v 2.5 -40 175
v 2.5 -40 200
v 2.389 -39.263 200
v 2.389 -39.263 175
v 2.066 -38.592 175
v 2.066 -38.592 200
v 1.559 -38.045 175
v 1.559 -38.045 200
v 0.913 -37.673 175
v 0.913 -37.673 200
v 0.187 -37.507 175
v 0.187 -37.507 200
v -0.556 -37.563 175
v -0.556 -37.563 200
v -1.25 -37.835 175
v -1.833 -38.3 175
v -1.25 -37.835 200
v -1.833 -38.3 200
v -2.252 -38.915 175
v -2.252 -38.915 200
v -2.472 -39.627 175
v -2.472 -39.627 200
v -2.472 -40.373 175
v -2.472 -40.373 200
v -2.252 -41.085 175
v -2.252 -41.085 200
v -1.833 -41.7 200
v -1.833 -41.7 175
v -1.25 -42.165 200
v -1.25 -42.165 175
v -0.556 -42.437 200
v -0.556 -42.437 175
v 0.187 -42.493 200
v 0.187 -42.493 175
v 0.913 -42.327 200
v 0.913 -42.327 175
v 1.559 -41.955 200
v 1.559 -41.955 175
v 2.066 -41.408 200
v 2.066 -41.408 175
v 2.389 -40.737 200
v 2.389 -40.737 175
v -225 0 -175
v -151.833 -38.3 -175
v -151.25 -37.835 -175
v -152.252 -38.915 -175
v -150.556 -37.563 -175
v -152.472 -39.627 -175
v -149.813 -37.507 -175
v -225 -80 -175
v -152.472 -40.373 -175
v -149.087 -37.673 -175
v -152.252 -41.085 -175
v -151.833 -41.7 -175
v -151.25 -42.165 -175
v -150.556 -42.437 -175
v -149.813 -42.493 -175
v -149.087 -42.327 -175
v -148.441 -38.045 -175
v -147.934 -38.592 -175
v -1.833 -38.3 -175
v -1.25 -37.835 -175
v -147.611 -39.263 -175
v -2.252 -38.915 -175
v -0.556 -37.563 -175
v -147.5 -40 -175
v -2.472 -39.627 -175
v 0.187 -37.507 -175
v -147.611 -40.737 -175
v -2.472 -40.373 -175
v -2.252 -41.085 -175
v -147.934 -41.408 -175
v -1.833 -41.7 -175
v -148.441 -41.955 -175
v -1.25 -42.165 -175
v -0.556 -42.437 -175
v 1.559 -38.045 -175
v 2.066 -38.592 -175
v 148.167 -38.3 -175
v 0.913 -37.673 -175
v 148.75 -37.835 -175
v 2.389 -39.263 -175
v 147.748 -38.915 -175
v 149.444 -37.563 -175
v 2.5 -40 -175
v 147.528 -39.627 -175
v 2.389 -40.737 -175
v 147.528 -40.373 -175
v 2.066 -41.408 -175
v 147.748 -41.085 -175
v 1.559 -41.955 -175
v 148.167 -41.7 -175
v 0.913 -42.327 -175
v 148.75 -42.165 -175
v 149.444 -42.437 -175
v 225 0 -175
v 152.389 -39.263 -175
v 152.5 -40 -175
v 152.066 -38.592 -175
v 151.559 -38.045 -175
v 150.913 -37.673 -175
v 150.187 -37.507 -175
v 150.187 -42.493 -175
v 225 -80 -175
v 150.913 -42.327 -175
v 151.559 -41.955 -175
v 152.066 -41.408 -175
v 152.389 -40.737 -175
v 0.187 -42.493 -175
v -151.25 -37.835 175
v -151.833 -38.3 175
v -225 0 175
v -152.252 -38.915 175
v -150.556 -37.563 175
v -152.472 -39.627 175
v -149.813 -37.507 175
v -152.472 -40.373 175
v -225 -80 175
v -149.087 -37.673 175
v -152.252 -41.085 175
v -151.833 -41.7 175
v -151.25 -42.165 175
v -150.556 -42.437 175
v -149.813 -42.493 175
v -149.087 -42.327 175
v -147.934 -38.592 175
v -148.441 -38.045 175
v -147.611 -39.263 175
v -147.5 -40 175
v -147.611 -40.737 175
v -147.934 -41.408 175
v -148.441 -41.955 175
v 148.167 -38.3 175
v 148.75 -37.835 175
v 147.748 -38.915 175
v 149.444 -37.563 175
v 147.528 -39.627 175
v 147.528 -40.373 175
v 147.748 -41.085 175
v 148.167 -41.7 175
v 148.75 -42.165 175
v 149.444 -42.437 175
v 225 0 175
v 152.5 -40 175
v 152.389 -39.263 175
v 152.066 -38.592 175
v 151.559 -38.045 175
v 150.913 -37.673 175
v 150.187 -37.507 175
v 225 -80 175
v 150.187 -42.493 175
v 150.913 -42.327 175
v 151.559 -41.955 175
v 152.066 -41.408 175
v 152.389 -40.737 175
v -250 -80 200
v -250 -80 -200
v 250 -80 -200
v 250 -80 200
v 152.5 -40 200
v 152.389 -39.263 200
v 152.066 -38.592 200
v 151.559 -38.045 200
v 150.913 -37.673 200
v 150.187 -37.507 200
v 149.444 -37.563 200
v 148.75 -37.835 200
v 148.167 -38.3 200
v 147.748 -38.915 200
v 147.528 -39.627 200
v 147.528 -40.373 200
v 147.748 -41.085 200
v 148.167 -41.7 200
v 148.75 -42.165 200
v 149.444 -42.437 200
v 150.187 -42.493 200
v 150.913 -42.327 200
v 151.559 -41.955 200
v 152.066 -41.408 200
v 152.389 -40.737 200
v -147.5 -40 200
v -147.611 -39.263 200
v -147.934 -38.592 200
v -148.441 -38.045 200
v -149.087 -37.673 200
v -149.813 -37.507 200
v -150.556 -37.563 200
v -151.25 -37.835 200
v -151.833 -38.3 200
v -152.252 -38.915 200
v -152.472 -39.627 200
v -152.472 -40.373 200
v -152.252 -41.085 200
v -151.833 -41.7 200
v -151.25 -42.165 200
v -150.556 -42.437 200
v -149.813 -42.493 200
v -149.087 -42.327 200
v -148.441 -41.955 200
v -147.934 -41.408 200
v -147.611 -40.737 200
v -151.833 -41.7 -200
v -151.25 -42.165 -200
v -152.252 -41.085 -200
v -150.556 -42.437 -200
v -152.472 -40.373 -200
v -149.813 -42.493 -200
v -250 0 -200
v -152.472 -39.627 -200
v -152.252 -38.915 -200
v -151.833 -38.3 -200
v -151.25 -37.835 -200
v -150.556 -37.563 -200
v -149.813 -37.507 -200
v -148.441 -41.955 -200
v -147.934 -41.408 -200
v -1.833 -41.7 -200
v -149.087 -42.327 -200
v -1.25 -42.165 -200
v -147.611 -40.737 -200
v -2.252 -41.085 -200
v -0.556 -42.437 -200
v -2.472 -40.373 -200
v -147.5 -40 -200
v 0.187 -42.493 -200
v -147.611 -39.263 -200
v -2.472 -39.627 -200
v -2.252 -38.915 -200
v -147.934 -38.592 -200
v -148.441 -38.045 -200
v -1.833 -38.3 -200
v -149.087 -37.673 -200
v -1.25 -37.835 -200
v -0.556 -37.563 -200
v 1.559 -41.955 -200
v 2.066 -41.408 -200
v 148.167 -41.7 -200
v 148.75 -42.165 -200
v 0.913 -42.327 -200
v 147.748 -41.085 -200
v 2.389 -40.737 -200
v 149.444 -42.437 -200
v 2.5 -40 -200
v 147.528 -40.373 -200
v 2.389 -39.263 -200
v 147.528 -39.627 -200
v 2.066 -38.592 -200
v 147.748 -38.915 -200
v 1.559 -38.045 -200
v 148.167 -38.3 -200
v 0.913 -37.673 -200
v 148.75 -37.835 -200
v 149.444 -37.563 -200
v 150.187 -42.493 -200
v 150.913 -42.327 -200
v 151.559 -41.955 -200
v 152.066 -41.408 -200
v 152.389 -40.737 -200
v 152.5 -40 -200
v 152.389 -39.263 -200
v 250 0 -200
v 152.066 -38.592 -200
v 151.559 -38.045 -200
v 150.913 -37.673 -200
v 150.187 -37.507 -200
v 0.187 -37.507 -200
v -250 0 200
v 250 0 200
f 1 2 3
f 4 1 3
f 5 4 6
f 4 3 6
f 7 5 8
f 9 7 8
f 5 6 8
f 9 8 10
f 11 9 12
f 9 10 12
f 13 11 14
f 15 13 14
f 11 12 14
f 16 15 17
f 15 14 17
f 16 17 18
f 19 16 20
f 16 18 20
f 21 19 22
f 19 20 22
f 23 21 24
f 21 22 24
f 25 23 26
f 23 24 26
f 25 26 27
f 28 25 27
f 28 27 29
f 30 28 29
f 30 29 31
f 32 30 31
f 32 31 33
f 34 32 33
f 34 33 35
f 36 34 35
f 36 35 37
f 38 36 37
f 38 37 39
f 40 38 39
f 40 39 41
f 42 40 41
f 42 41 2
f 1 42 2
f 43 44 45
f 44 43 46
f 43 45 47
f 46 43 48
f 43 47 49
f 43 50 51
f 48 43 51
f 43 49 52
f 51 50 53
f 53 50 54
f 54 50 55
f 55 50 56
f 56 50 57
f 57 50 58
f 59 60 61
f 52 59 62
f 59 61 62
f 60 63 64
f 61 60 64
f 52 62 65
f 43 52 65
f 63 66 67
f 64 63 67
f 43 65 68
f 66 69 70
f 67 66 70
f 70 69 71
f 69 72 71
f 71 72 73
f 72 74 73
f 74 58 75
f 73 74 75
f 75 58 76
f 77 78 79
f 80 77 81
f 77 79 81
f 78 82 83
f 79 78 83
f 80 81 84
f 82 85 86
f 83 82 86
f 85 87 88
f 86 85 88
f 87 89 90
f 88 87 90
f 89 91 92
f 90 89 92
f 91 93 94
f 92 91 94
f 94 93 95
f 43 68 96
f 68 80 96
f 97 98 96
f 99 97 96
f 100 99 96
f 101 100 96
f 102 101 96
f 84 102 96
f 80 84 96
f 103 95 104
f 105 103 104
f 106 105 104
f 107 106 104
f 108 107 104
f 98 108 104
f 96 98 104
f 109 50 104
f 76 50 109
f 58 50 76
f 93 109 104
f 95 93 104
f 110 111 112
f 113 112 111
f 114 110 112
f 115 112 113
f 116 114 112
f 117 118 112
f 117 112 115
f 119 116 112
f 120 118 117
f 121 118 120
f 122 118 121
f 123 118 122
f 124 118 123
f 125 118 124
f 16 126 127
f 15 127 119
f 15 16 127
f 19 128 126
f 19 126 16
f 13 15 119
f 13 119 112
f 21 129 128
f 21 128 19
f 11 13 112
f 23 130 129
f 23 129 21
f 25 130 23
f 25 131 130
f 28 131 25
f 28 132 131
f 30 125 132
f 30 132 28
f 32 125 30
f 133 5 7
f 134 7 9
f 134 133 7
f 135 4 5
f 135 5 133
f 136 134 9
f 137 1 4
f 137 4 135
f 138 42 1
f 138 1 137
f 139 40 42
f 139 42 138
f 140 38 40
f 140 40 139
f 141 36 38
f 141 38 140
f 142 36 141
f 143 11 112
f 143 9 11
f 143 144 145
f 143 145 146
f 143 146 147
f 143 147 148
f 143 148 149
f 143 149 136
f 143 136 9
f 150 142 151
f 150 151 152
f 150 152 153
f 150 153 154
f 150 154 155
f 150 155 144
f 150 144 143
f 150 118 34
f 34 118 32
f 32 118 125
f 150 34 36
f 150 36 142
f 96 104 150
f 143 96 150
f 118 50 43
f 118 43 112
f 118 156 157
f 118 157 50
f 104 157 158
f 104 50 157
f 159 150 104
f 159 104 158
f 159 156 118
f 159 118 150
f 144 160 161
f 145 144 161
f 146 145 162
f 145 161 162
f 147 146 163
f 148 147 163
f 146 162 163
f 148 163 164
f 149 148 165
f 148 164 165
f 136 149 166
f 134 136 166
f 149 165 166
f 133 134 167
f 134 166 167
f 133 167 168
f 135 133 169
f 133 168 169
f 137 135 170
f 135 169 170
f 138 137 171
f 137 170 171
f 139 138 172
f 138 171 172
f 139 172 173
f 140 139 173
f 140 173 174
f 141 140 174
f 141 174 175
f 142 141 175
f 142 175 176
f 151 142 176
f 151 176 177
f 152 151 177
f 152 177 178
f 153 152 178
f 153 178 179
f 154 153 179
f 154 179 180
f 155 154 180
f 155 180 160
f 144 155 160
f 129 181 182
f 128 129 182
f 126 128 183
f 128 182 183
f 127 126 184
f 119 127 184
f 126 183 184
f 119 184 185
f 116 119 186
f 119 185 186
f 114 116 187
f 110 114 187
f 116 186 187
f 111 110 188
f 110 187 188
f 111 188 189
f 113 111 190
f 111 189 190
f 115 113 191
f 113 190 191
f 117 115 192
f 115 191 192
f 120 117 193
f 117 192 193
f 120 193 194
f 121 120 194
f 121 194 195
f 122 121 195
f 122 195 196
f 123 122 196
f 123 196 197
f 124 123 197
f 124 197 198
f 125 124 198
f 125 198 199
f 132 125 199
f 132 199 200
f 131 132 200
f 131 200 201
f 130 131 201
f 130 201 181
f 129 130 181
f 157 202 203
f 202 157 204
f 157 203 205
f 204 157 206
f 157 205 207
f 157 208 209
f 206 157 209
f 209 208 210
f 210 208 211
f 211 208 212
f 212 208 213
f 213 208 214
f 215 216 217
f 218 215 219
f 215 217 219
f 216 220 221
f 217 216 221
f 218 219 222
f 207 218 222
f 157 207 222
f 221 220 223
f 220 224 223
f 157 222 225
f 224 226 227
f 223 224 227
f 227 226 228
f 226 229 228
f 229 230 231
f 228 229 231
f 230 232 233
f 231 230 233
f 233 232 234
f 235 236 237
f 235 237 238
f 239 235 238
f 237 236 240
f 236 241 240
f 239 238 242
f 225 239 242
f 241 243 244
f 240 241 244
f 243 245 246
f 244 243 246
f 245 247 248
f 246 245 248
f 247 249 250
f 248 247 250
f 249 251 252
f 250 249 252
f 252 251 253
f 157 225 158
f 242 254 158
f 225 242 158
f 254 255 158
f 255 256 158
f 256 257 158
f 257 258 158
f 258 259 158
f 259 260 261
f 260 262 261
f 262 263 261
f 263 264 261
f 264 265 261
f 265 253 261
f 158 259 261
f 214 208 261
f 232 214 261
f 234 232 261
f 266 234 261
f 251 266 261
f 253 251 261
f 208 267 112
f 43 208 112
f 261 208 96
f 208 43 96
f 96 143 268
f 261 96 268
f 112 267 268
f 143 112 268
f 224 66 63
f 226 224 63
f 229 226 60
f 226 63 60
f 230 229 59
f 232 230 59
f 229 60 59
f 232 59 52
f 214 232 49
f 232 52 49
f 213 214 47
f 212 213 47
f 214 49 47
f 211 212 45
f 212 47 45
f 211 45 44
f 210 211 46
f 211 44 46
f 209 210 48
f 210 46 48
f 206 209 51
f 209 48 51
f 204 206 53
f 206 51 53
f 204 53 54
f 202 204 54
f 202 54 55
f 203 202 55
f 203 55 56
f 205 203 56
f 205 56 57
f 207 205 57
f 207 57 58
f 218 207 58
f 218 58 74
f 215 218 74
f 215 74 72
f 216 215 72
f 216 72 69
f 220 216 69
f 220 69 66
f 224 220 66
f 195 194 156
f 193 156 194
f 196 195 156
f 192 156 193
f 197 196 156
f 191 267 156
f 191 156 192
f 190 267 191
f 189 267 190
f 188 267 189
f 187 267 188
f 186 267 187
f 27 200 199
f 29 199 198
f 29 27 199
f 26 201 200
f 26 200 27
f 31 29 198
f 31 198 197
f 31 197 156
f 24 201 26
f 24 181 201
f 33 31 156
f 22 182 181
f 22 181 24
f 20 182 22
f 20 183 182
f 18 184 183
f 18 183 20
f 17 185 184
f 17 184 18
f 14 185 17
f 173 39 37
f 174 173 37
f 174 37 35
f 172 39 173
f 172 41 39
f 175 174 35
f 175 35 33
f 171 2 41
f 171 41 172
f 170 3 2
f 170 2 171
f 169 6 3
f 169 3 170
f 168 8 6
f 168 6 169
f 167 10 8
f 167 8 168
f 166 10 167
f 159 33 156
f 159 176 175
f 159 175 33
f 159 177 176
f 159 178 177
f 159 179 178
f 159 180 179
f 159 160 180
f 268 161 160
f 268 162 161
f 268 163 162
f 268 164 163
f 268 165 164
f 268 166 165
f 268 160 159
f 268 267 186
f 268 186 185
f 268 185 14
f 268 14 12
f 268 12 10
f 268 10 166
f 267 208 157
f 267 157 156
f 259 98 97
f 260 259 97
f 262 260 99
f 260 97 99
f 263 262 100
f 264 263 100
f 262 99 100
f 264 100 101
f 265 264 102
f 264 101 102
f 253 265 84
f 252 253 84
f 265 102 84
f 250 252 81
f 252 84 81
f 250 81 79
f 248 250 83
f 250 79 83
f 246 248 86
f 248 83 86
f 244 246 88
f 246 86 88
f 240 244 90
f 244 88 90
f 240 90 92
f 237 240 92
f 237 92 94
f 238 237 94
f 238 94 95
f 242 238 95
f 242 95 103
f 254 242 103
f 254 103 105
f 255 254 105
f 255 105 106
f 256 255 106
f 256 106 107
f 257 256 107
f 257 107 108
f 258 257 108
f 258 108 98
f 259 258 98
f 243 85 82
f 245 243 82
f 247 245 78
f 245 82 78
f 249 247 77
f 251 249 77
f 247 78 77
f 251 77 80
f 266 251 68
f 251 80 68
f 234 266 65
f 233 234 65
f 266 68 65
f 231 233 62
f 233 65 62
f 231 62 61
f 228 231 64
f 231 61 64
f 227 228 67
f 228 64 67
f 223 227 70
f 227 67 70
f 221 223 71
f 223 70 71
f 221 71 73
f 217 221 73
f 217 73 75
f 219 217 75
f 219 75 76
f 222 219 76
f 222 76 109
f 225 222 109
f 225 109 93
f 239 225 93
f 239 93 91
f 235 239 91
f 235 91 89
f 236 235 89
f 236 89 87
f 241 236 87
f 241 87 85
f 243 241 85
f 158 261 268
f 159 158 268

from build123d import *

# Parameters (mm, degrees)
F0_W     = 500
F0_H     = 400
F1_DEPTH = 80
F2_W     = 450
F2_H     = 350
F3_DEPTH = 80
F4_R     = 2.5
F5_DEPTH = 400.001


with BuildPart() as f1:
    # F0 (on Front) → F1 (new body)
    with BuildSketch(Plane.XZ):
        Rectangle(F0_W, F0_H)
    extrude(amount=F1_DEPTH)

    # F2 (on face) → F3 (cut, through all)
    with BuildSketch(Plane.XZ.offset(80)):
        Rectangle(F2_W, F2_H)
    extrude(amount=-F3_DEPTH, mode=Mode.SUBTRACT)

    # F4 (on face) → F5 (cut, through all)
    with BuildSketch(Plane.XY.offset(200)):
        with Locations((-150, -40)):
            Circle(F4_R)
        with Locations((0, -40)):
            Circle(F4_R)
        with Locations((150, -40)):
            Circle(F4_R)
    extrude(amount=-F5_DEPTH, mode=Mode.SUBTRACT)


solid = f1.part
